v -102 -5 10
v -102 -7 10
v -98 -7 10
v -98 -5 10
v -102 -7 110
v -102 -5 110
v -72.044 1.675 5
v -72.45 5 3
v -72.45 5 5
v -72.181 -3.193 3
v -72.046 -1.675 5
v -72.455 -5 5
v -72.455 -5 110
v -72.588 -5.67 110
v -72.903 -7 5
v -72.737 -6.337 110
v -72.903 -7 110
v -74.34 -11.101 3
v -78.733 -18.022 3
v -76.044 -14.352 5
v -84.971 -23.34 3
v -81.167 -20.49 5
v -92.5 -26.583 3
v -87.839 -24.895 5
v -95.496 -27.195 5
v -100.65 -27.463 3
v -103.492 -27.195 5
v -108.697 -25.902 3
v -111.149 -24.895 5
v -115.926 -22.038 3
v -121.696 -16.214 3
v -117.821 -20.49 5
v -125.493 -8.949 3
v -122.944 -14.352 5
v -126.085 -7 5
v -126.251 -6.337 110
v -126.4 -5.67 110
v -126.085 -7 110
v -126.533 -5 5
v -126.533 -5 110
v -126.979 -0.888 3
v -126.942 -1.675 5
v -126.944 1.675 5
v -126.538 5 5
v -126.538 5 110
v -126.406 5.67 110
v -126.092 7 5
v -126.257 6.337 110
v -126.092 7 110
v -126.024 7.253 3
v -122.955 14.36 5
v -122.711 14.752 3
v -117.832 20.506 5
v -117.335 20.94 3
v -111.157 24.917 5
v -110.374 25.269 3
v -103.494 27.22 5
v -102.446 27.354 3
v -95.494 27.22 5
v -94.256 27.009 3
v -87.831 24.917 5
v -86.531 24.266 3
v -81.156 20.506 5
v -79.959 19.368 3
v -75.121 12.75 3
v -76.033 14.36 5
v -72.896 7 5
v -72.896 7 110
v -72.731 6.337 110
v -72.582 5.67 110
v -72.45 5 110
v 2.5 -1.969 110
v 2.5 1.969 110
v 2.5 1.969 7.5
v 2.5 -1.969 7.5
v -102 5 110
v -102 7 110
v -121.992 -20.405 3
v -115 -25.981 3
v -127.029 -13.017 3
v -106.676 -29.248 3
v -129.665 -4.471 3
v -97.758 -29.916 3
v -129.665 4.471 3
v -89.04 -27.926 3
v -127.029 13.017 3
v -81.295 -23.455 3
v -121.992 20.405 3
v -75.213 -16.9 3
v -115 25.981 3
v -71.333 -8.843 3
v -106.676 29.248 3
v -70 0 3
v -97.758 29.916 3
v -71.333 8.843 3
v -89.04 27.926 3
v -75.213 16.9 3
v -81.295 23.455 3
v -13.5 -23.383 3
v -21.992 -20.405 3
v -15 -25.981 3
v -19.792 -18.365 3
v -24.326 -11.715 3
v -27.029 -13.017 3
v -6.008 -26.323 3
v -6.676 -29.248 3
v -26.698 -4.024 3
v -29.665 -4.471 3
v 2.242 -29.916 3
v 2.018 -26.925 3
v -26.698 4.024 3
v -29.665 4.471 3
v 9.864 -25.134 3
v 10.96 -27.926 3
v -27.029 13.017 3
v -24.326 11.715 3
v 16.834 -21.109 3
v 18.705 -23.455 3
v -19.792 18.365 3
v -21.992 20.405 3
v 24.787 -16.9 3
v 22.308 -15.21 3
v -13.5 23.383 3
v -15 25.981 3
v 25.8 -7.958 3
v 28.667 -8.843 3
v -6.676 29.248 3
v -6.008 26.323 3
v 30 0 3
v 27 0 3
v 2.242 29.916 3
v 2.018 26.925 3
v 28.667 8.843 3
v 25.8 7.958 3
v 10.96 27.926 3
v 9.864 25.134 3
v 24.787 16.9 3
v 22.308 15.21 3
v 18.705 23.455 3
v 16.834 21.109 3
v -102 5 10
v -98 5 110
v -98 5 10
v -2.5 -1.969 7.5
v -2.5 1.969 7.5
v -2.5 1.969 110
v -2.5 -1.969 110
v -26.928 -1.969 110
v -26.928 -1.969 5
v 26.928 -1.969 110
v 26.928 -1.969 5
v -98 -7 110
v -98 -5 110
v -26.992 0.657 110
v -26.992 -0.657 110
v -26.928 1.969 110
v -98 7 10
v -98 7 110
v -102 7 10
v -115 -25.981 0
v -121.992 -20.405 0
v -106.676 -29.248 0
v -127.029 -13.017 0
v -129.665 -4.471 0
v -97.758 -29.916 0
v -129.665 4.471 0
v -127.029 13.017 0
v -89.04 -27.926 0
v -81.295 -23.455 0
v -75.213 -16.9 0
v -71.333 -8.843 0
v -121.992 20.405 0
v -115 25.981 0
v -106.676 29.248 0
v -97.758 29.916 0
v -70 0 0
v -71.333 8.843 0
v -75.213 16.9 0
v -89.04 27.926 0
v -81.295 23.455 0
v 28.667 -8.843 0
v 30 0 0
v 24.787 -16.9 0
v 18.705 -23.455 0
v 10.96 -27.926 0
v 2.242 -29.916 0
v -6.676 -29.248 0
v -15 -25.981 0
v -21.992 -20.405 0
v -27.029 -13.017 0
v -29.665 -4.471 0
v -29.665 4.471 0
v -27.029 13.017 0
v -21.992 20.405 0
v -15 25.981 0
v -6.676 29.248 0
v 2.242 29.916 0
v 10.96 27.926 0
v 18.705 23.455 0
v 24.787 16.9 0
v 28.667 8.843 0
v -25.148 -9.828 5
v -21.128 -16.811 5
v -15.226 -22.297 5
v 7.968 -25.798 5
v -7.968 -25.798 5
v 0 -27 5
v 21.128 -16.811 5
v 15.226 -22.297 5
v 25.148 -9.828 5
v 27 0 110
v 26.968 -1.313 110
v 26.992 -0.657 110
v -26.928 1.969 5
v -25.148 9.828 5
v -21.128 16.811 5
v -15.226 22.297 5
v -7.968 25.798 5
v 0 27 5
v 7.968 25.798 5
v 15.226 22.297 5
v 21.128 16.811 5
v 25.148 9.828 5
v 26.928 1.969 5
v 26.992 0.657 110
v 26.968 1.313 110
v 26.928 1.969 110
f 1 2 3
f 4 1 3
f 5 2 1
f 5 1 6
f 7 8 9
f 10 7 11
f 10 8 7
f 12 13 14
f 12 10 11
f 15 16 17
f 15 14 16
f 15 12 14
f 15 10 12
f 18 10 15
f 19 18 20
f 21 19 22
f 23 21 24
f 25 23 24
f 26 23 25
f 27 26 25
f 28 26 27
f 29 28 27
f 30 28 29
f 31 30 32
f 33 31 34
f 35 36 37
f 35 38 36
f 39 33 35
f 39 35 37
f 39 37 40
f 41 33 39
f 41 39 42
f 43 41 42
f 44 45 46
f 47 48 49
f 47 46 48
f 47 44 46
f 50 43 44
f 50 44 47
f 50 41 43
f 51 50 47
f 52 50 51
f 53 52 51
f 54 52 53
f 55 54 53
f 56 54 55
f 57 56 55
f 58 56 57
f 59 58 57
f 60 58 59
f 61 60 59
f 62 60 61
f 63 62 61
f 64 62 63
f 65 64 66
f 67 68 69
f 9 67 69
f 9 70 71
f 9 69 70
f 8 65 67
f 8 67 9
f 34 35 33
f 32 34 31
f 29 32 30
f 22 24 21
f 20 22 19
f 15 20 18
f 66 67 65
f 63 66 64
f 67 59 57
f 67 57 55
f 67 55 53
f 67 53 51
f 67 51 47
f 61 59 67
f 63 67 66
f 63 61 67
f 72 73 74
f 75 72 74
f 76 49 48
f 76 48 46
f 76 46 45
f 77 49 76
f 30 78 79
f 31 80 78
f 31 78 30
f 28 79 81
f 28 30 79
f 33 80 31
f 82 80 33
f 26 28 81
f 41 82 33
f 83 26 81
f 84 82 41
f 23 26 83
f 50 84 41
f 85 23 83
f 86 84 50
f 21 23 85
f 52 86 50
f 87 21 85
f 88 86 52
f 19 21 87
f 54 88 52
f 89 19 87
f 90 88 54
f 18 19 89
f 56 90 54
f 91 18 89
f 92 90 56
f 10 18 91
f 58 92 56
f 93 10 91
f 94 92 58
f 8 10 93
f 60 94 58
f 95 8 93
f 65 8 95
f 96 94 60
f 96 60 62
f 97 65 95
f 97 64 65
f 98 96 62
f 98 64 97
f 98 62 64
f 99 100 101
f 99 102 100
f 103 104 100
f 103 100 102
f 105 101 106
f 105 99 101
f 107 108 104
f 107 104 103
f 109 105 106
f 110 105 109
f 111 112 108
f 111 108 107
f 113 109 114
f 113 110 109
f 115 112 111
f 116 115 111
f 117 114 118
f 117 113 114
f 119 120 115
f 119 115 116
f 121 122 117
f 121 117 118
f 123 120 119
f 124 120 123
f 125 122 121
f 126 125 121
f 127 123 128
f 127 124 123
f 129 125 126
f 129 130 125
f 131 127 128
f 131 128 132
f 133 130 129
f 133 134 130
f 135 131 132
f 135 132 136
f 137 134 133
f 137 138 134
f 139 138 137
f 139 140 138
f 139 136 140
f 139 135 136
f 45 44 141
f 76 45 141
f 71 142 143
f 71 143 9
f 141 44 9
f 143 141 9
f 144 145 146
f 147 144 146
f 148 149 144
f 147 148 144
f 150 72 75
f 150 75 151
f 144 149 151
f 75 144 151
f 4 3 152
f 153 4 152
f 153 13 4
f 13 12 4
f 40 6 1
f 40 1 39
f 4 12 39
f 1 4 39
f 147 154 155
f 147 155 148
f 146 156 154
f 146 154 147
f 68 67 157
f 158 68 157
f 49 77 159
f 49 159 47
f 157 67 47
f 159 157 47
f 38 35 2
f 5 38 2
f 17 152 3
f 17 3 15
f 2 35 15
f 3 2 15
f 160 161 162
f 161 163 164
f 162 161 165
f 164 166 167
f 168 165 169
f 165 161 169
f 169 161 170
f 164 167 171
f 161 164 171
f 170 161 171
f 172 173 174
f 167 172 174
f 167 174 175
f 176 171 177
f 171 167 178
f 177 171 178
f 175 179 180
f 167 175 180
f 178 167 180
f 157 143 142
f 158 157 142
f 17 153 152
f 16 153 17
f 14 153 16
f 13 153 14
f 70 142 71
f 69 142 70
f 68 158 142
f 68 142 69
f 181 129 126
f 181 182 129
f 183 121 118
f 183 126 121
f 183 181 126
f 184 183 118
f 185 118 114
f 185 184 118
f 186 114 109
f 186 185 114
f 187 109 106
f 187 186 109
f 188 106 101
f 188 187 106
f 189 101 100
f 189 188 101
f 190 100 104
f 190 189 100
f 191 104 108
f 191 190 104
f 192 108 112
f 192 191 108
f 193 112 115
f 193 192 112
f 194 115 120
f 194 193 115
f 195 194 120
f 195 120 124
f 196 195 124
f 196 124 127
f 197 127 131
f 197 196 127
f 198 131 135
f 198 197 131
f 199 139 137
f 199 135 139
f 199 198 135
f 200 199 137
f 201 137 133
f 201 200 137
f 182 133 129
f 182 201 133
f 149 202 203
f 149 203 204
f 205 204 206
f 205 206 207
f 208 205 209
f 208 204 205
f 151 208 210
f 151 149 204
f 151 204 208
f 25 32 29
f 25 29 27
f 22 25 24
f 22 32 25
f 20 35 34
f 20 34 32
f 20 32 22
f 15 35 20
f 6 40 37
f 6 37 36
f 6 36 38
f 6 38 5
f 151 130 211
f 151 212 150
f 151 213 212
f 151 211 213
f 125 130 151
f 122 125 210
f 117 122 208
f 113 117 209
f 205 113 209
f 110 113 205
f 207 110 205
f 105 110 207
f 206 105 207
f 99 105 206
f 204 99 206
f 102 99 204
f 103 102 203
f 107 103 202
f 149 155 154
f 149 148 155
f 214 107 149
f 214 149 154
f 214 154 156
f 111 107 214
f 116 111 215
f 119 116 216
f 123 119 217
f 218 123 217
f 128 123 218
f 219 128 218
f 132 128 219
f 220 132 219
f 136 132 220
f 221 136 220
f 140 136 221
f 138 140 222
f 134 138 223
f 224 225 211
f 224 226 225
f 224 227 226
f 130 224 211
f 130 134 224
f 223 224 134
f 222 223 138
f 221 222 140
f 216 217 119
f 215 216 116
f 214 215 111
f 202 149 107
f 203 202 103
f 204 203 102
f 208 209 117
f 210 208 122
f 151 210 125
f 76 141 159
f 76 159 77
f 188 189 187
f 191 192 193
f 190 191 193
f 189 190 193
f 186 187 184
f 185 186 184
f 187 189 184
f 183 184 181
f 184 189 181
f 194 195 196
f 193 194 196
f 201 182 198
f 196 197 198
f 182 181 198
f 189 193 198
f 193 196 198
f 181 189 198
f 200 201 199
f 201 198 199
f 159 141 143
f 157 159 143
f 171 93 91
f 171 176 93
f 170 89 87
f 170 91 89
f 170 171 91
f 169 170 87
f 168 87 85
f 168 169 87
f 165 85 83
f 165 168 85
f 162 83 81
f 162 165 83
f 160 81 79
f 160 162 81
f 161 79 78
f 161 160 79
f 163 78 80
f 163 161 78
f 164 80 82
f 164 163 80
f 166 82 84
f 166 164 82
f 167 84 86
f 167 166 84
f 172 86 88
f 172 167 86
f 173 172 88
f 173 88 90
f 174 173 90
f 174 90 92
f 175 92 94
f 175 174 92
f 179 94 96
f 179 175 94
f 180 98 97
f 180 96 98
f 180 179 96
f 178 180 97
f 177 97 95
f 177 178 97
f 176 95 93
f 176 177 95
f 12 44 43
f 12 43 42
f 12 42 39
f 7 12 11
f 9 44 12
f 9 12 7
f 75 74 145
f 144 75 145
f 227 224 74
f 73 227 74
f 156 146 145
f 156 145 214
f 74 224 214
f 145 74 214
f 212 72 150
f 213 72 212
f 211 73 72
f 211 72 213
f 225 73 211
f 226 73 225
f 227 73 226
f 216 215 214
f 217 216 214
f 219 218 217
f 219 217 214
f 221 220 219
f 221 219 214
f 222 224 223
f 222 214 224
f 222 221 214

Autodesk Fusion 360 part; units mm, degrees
sketch "Base" plane through (0, 0, 0) normal (0, 0, 1) x (1, 0, 0)
  circle A0 centre (0, 0) radius 30
  circle A1 centre (0, 0) radius 28
  dimension "d1" = 60
  dimension "d2" = 56
extrude "Extrude1" add sketch "Base" along normal blind 2 contours A1 makes body 1
extrude "Extrude2" add sketch "Base" along normal blind 113 bodies 1
sketch "Sketch2" plane through (0, 0, 0) normal (0, 0, 1) x (1, 0, 0)
  circle A0 centre (0, 0) radius 27
  line L0 (0, -1.9691) -> (26.9281, -1.9691)
  line L1 (-26.9281, -1.9691) -> (0, -1.9691)
  line L2 (0, 1.9691) -> (-26.9281, 1.9691)
  line L3 (26.9281, 1.9691) -> (0, 1.9691)
  circle A1 centre (0, 0) radius 30
  dimension "d46" = 54
extrude "Extrude3" add sketch "Sketch2" along normal blind 3 separate body makes body 2
extrude "Extrude4" add sketch "Sketch2" along normal blind 5 contours A0 L0 L1 bodies 2
extrude "Extrude5" add sketch "Sketch2" along normal blind 5 contours A0 L2 L3 bodies 2
extrude "Extrude6" add sketch "Sketch2" along normal blind 110 contours A0 L0 L1 L2 L3 bodies 2
sketch "Sketch6" plane through (0, 1.9691, 0) normal (0, 1, 0) x (-1, 0, 0)
  line L0 (-26.9281, 5) -> (26.9281, 5)
  line L1 (26.9281, 5) -> (26.9281, 110)
  line L2 (26.9281, 110) -> (-26.9281, 110)
  line L3 (-26.9281, 110) -> (-26.9281, 5)
  line L4 (-2.5, 7.5) -> (2.5, 7.5)
  line L5 (2.5, 7.5) -> (2.5, 110)
  line L6 (-2.5, 110) -> (2.5, 110)
  line L7 (-2.5, 110) -> (-2.5, 7.5)
  dimension "d15" = 102.5
  dimension "d16" = 5
extrude "Extrude7" cut sketch "Sketch6" against normal blind 4 contours L2 L4 L5 L6 L7 bodies 2
sketch "Sketch7" plane through (0, 0, 0) normal (0, 0, 1) x (1, 0, 0)
  circle A0 centre (-100, 0) radius 30
  circle A1 centre (-99.494, 0.0128) radius 27.5
  line L0 (-100, 5) -> (-72.45, 5)
  line L1 (-100, -5) -> (-72.4548, -5)
  line L2 (-100, -5) -> (-126.5333, -5)
  line L3 (-100, 5) -> (-126.538, 5)
  line L4 (-100, -7) -> (-72.9032, -7)
  line L5 (-100, -7) -> (-126.0848, -7)
  line L6 (-100, 7) -> (-72.8965, 7)
  line L7 (-100, 7) -> (-126.0916, 7)
  dimension "d35" = 55
extrude "Extrude8" add sketch "Sketch7" along normal blind 3 separate body makes body 3
extrude "Extrude9" add sketch "Sketch7" along normal blind 5 contours A1 L6 L7 bodies 3
extrude "Extrude10" add sketch "Sketch7" along normal blind 5 contours A1 L0 L1 L2 L3 bodies 3
extrude "Extrude11" add sketch "Sketch7" along normal blind 5 contours A1 L4 L5 bodies 3
extrude "Extrude12" add sketch "Sketch7" along normal blind 110 contours A1 L0 L3 L6 L7 bodies 3
extrude "Extrude13" add sketch "Sketch7" along normal blind 110 contours A1 L1 L2 L4 L5 bodies 3
sketch "Sketch8" plane through (0, -7, 0) normal (0, -1, 0) x (1, 0, 0)
  line L0 (-126.0848, 5) -> (-72.9032, 5)
  line L1 (-72.9032, 5) -> (-72.9032, 110)
  line L2 (-72.9032, 110) -> (-126.0848, 110)
  line L3 (-126.0848, 110) -> (-126.0848, 5)
  line L4 (-102, 10) -> (-98, 10)
  line L5 (-98, 10) -> (-98, 110)
  line L6 (-102, 10) -> (-102, 110)
extrude "Extrude14" cut sketch "Sketch8" against normal blind 200 contours L2 L4 L5 L6 bodies 3
extrude "Extrude15" add sketch "Sketch7" along normal blind 3 separate body makes body 4
extrude "Extrude16" add sketch "Sketch7" along normal blind 5 contours A1 L6 L7 | A1 L4 L5 bodies 4
extrude "Extrude17" add sketch "Sketch7" along normal blind 5 contours A1 L0 L1 L2 L3 bodies 4
extrude "Extrude18" add sketch "Sketch7" along normal blind 110 contours A1 L0 L3 L6 L7 | A1 L1 L2 L4 L5 bodies 4
extrude "Extrude19" cut sketch "Sketch8" against normal blind 200 contours L2 L4 L5 L6 bodies 4
hidden bodies 1 3
